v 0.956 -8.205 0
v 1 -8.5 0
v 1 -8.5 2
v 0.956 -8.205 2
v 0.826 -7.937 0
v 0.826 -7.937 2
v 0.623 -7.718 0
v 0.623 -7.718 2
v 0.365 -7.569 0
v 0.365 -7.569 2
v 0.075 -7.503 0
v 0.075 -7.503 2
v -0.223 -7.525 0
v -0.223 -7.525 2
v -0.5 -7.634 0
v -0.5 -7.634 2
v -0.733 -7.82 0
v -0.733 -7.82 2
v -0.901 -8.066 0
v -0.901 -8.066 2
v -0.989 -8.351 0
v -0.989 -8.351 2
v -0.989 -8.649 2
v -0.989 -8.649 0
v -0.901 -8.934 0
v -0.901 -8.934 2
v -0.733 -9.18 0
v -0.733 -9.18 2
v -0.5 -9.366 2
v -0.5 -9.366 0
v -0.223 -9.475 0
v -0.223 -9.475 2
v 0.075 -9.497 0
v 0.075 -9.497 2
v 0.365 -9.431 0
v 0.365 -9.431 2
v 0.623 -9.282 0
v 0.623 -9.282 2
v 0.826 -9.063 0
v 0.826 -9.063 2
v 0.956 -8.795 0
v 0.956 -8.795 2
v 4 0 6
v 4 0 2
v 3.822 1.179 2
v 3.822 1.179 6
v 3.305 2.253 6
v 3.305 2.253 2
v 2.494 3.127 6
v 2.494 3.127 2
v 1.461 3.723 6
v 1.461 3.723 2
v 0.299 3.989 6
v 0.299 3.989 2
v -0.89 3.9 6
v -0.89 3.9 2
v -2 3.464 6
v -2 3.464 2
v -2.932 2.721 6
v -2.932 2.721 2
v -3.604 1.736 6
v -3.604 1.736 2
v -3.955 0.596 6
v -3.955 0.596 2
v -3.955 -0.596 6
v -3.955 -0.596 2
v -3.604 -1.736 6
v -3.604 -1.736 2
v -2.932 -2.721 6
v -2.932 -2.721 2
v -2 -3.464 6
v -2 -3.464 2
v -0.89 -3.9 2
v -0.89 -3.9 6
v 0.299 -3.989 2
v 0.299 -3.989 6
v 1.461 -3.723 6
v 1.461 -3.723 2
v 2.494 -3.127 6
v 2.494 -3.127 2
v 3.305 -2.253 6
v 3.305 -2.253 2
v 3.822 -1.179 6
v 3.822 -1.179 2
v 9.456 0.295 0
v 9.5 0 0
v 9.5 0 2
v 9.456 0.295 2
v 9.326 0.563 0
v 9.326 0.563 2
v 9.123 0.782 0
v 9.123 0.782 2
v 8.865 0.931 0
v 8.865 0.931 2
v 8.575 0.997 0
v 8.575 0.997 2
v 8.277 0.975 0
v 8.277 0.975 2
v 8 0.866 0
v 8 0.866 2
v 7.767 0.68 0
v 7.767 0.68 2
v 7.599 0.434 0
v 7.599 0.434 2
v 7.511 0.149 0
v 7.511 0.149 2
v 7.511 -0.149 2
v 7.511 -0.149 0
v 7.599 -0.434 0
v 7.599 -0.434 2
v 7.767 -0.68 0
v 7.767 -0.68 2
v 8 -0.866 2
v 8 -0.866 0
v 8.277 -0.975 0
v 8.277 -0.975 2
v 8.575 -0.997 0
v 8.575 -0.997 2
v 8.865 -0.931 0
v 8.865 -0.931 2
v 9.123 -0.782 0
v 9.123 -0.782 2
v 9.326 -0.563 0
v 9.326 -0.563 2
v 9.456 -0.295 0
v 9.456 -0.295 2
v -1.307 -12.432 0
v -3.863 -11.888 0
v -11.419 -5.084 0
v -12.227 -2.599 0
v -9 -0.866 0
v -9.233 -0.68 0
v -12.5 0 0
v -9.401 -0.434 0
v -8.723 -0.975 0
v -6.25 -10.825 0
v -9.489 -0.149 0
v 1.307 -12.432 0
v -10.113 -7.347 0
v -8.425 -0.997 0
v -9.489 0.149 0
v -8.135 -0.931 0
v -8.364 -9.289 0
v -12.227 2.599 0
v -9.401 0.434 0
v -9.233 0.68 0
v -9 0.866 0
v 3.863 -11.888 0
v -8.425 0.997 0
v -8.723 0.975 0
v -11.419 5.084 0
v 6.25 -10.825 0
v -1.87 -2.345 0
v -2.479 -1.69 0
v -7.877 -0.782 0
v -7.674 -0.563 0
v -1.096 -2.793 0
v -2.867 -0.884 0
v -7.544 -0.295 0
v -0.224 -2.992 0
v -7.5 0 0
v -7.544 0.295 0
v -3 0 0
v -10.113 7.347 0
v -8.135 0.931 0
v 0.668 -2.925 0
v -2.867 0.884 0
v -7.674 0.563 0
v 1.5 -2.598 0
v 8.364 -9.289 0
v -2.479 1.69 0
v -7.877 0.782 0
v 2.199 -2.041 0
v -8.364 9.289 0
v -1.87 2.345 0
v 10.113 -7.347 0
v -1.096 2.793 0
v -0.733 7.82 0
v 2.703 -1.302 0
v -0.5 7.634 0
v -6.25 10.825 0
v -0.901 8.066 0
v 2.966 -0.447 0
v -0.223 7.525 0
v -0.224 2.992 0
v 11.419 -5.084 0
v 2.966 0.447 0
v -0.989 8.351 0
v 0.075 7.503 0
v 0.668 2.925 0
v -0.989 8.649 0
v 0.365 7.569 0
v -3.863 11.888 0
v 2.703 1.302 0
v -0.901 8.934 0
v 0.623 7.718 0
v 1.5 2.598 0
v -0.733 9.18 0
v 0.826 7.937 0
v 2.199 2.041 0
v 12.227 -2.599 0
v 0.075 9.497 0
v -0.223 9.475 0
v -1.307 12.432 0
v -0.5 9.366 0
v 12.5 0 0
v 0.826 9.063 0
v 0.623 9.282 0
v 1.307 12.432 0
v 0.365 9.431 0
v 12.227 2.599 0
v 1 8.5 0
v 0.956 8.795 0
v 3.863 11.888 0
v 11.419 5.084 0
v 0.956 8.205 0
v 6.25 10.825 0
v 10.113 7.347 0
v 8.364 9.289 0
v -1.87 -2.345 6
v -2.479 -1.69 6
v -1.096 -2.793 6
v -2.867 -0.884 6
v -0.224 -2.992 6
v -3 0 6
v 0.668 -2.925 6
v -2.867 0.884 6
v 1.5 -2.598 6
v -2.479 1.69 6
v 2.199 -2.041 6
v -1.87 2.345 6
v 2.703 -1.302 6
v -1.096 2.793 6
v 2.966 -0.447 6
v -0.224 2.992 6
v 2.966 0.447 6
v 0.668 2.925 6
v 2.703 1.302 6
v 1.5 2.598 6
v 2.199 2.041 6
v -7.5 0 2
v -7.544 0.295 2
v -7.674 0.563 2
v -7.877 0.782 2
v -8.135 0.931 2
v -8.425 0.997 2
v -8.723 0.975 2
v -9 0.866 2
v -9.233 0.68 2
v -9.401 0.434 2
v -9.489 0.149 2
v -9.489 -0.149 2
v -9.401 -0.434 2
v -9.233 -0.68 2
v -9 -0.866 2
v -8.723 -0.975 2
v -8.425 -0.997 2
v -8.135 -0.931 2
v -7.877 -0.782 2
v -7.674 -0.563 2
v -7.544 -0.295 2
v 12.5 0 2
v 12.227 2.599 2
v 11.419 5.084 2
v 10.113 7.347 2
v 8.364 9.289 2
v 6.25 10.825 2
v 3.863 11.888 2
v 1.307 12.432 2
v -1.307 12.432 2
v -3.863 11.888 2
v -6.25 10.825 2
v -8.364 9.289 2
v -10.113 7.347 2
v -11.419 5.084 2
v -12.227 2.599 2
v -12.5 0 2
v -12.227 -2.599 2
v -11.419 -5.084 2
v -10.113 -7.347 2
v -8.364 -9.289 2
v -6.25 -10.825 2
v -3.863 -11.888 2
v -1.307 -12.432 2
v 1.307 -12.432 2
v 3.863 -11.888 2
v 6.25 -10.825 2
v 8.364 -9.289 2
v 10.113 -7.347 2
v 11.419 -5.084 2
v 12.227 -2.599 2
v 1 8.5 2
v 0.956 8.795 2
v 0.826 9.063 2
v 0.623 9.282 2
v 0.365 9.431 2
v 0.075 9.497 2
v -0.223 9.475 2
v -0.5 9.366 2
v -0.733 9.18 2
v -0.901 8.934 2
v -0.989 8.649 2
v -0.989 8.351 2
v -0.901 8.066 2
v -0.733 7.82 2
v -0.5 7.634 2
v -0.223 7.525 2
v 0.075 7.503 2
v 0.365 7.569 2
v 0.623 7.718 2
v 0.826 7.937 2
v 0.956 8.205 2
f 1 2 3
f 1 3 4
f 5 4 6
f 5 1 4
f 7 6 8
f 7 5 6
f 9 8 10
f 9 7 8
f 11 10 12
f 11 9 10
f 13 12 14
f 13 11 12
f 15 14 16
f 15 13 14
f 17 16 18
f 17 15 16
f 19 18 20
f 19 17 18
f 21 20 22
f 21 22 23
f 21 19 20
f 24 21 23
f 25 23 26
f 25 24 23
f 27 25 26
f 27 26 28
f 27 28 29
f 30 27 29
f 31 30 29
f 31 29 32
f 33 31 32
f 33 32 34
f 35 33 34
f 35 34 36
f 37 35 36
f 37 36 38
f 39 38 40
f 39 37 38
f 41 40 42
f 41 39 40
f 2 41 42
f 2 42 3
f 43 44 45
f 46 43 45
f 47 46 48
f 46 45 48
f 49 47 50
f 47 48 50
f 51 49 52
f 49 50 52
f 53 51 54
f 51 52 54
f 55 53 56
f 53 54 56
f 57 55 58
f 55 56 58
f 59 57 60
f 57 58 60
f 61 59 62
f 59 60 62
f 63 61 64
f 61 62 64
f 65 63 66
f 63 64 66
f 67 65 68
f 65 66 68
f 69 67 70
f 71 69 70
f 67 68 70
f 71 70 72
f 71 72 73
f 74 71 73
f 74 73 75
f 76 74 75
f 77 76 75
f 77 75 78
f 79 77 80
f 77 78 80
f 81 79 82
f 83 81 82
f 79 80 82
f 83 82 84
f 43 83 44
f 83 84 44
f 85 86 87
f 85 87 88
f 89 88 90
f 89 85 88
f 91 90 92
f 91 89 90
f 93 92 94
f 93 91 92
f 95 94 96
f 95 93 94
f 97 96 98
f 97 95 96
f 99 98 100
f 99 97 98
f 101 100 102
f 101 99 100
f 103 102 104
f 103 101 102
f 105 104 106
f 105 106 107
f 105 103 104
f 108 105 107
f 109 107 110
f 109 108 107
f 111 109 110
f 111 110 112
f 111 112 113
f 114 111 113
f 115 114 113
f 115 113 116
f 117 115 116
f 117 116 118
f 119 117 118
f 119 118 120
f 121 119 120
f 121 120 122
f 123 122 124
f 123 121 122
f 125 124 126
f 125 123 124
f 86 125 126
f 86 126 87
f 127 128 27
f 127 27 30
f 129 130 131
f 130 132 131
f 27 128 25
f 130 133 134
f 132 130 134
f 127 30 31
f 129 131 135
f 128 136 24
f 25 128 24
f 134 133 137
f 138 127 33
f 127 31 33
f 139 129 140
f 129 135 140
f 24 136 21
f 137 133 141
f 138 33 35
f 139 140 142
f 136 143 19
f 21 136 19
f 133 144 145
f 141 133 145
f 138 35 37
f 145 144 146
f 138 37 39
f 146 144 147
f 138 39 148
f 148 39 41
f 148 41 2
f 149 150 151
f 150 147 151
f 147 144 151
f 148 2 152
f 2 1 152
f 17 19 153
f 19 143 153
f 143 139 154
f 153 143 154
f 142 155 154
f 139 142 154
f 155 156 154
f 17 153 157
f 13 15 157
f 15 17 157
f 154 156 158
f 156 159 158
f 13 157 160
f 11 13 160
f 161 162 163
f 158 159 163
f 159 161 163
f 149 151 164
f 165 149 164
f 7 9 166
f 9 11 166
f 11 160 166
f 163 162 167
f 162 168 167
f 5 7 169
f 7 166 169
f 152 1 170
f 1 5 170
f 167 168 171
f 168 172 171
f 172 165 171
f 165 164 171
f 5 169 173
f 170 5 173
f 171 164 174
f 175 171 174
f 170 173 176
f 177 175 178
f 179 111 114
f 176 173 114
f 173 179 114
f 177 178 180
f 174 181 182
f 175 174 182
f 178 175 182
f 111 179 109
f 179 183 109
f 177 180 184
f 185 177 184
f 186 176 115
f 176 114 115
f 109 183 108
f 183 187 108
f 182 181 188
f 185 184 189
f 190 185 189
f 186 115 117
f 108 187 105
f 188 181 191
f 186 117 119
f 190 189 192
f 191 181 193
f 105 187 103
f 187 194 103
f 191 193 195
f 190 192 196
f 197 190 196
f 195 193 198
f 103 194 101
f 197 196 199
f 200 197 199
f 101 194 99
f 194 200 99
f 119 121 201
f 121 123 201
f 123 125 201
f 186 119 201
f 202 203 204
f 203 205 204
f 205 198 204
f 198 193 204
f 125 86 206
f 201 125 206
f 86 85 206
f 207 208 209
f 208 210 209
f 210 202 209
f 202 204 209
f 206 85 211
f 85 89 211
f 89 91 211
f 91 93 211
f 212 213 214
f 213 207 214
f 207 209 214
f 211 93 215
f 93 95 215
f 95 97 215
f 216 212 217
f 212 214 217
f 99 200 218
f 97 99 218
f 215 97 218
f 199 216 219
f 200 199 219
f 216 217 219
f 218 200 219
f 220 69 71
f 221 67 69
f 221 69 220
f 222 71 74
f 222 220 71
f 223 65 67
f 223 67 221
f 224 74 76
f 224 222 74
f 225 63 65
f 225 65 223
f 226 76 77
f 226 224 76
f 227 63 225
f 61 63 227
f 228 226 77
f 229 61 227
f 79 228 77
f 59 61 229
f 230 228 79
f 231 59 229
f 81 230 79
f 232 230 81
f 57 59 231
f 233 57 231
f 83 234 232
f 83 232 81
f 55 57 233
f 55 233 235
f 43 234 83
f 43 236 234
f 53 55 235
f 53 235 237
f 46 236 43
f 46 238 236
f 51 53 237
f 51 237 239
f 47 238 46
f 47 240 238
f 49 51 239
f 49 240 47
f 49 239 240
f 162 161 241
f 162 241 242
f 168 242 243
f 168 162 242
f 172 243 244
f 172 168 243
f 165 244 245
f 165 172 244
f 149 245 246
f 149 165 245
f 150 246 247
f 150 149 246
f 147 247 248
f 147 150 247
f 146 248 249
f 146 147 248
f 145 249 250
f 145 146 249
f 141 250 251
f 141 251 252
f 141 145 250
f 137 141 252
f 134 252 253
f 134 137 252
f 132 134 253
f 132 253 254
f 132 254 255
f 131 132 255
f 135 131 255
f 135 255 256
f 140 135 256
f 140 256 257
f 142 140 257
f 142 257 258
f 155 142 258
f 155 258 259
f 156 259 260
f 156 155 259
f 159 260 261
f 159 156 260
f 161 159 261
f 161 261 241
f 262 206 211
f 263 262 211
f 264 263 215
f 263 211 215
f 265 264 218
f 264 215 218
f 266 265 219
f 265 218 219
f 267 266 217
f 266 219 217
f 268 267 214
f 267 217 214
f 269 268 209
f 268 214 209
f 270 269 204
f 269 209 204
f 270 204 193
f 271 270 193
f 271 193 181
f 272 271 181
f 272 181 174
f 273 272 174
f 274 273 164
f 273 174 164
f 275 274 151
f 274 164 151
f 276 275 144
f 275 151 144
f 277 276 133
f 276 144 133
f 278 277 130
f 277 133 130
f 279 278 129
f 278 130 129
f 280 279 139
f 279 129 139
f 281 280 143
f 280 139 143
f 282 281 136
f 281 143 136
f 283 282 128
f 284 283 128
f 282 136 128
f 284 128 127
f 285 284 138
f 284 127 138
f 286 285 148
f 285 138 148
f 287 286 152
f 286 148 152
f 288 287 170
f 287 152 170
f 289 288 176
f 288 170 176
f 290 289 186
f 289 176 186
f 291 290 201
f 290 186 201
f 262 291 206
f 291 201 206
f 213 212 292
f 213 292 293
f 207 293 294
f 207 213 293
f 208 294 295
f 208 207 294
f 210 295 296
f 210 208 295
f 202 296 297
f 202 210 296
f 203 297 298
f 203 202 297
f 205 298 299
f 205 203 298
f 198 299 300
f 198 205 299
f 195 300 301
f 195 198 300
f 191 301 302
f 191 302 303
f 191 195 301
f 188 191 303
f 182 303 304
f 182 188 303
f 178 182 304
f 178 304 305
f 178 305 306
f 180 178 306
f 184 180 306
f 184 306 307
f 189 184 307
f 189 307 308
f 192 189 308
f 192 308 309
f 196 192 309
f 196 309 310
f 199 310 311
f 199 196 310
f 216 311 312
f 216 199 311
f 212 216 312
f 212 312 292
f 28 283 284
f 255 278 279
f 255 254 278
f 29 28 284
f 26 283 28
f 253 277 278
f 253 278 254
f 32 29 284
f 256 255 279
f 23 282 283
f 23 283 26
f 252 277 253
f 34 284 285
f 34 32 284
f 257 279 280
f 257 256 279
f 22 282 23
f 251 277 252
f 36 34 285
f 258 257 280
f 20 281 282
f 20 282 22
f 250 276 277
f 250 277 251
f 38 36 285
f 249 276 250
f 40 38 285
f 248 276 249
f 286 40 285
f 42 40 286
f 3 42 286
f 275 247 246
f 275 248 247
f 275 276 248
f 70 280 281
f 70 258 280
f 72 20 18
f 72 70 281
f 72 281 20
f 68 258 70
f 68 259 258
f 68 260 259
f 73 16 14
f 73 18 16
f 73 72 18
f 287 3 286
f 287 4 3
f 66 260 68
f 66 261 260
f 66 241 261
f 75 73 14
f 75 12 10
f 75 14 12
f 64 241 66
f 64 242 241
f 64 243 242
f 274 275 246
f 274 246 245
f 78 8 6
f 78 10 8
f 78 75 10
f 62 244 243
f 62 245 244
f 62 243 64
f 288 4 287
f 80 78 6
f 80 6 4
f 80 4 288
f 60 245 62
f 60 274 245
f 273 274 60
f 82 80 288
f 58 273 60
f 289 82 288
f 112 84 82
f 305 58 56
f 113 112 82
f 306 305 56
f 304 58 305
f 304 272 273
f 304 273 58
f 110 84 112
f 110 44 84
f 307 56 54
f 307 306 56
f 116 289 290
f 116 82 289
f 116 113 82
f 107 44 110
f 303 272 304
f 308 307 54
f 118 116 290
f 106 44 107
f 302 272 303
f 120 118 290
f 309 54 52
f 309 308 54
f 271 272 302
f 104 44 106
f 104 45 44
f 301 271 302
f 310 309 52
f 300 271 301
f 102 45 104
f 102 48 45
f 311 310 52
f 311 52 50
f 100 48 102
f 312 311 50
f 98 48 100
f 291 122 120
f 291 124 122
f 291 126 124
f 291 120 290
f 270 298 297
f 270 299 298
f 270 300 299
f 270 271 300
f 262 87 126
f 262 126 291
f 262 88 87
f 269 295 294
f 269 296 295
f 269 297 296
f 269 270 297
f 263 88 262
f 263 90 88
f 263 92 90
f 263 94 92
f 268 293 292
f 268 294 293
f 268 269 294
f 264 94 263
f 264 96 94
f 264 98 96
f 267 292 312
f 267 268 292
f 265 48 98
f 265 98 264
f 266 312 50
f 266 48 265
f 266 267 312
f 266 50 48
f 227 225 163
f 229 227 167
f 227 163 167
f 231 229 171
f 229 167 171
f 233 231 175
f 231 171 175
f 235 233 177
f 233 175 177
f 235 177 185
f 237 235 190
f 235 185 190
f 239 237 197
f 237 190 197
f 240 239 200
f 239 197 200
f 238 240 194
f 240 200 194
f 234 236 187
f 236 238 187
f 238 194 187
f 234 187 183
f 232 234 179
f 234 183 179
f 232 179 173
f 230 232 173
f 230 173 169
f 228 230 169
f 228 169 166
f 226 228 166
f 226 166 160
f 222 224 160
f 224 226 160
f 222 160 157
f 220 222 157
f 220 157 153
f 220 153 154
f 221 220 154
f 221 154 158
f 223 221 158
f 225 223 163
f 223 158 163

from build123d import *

# Parameters (mm, degrees)
SKETCH1_R           = 12.5
SKETCH1_R_2         = 1
BOSS_EXTRUDE1_DEPTH = 2
SKETCH2_R           = 4
SKETCH2_R_2         = 3
BOSS_EXTRUDE2_DEPTH = 4
SKETCH3_R           = 3
CUT_EXTRUDE1_DEPTH  = 19.668154703


with BuildPart() as part:
    # Sketch1 → Boss-Extrude1 (new body)
    with BuildSketch(Plane.XY):
        Circle(SKETCH1_R)
        with Locations((-8.5, 0)):
            Circle(SKETCH1_R_2, mode=Mode.SUBTRACT)
        with Locations((0, 8.5)):
            Circle(SKETCH1_R_2, mode=Mode.SUBTRACT)
        with Locations((8.5, 0)):
            Circle(SKETCH1_R_2, mode=Mode.SUBTRACT)
        with Locations((0, -8.5)):
            Circle(SKETCH1_R_2, mode=Mode.SUBTRACT)
    extrude(amount=BOSS_EXTRUDE1_DEPTH)

    # Sketch2 → Boss-Extrude2 (add)
    with BuildSketch(Plane.XY.offset(2)):
        Circle(SKETCH2_R)
        Circle(SKETCH2_R_2, mode=Mode.SUBTRACT)
    extrude(amount=BOSS_EXTRUDE2_DEPTH)

    # Sketch3 → Cut-Extrude1 (cut, through all)
    with BuildSketch(Plane(origin=(0, 0, 0), x_dir=(-1, 0, 0), z_dir=(0, 0, -1))):
        Circle(SKETCH3_R)
    extrude(amount=-CUT_EXTRUDE1_DEPTH, mode=Mode.SUBTRACT)


solid = part.part
